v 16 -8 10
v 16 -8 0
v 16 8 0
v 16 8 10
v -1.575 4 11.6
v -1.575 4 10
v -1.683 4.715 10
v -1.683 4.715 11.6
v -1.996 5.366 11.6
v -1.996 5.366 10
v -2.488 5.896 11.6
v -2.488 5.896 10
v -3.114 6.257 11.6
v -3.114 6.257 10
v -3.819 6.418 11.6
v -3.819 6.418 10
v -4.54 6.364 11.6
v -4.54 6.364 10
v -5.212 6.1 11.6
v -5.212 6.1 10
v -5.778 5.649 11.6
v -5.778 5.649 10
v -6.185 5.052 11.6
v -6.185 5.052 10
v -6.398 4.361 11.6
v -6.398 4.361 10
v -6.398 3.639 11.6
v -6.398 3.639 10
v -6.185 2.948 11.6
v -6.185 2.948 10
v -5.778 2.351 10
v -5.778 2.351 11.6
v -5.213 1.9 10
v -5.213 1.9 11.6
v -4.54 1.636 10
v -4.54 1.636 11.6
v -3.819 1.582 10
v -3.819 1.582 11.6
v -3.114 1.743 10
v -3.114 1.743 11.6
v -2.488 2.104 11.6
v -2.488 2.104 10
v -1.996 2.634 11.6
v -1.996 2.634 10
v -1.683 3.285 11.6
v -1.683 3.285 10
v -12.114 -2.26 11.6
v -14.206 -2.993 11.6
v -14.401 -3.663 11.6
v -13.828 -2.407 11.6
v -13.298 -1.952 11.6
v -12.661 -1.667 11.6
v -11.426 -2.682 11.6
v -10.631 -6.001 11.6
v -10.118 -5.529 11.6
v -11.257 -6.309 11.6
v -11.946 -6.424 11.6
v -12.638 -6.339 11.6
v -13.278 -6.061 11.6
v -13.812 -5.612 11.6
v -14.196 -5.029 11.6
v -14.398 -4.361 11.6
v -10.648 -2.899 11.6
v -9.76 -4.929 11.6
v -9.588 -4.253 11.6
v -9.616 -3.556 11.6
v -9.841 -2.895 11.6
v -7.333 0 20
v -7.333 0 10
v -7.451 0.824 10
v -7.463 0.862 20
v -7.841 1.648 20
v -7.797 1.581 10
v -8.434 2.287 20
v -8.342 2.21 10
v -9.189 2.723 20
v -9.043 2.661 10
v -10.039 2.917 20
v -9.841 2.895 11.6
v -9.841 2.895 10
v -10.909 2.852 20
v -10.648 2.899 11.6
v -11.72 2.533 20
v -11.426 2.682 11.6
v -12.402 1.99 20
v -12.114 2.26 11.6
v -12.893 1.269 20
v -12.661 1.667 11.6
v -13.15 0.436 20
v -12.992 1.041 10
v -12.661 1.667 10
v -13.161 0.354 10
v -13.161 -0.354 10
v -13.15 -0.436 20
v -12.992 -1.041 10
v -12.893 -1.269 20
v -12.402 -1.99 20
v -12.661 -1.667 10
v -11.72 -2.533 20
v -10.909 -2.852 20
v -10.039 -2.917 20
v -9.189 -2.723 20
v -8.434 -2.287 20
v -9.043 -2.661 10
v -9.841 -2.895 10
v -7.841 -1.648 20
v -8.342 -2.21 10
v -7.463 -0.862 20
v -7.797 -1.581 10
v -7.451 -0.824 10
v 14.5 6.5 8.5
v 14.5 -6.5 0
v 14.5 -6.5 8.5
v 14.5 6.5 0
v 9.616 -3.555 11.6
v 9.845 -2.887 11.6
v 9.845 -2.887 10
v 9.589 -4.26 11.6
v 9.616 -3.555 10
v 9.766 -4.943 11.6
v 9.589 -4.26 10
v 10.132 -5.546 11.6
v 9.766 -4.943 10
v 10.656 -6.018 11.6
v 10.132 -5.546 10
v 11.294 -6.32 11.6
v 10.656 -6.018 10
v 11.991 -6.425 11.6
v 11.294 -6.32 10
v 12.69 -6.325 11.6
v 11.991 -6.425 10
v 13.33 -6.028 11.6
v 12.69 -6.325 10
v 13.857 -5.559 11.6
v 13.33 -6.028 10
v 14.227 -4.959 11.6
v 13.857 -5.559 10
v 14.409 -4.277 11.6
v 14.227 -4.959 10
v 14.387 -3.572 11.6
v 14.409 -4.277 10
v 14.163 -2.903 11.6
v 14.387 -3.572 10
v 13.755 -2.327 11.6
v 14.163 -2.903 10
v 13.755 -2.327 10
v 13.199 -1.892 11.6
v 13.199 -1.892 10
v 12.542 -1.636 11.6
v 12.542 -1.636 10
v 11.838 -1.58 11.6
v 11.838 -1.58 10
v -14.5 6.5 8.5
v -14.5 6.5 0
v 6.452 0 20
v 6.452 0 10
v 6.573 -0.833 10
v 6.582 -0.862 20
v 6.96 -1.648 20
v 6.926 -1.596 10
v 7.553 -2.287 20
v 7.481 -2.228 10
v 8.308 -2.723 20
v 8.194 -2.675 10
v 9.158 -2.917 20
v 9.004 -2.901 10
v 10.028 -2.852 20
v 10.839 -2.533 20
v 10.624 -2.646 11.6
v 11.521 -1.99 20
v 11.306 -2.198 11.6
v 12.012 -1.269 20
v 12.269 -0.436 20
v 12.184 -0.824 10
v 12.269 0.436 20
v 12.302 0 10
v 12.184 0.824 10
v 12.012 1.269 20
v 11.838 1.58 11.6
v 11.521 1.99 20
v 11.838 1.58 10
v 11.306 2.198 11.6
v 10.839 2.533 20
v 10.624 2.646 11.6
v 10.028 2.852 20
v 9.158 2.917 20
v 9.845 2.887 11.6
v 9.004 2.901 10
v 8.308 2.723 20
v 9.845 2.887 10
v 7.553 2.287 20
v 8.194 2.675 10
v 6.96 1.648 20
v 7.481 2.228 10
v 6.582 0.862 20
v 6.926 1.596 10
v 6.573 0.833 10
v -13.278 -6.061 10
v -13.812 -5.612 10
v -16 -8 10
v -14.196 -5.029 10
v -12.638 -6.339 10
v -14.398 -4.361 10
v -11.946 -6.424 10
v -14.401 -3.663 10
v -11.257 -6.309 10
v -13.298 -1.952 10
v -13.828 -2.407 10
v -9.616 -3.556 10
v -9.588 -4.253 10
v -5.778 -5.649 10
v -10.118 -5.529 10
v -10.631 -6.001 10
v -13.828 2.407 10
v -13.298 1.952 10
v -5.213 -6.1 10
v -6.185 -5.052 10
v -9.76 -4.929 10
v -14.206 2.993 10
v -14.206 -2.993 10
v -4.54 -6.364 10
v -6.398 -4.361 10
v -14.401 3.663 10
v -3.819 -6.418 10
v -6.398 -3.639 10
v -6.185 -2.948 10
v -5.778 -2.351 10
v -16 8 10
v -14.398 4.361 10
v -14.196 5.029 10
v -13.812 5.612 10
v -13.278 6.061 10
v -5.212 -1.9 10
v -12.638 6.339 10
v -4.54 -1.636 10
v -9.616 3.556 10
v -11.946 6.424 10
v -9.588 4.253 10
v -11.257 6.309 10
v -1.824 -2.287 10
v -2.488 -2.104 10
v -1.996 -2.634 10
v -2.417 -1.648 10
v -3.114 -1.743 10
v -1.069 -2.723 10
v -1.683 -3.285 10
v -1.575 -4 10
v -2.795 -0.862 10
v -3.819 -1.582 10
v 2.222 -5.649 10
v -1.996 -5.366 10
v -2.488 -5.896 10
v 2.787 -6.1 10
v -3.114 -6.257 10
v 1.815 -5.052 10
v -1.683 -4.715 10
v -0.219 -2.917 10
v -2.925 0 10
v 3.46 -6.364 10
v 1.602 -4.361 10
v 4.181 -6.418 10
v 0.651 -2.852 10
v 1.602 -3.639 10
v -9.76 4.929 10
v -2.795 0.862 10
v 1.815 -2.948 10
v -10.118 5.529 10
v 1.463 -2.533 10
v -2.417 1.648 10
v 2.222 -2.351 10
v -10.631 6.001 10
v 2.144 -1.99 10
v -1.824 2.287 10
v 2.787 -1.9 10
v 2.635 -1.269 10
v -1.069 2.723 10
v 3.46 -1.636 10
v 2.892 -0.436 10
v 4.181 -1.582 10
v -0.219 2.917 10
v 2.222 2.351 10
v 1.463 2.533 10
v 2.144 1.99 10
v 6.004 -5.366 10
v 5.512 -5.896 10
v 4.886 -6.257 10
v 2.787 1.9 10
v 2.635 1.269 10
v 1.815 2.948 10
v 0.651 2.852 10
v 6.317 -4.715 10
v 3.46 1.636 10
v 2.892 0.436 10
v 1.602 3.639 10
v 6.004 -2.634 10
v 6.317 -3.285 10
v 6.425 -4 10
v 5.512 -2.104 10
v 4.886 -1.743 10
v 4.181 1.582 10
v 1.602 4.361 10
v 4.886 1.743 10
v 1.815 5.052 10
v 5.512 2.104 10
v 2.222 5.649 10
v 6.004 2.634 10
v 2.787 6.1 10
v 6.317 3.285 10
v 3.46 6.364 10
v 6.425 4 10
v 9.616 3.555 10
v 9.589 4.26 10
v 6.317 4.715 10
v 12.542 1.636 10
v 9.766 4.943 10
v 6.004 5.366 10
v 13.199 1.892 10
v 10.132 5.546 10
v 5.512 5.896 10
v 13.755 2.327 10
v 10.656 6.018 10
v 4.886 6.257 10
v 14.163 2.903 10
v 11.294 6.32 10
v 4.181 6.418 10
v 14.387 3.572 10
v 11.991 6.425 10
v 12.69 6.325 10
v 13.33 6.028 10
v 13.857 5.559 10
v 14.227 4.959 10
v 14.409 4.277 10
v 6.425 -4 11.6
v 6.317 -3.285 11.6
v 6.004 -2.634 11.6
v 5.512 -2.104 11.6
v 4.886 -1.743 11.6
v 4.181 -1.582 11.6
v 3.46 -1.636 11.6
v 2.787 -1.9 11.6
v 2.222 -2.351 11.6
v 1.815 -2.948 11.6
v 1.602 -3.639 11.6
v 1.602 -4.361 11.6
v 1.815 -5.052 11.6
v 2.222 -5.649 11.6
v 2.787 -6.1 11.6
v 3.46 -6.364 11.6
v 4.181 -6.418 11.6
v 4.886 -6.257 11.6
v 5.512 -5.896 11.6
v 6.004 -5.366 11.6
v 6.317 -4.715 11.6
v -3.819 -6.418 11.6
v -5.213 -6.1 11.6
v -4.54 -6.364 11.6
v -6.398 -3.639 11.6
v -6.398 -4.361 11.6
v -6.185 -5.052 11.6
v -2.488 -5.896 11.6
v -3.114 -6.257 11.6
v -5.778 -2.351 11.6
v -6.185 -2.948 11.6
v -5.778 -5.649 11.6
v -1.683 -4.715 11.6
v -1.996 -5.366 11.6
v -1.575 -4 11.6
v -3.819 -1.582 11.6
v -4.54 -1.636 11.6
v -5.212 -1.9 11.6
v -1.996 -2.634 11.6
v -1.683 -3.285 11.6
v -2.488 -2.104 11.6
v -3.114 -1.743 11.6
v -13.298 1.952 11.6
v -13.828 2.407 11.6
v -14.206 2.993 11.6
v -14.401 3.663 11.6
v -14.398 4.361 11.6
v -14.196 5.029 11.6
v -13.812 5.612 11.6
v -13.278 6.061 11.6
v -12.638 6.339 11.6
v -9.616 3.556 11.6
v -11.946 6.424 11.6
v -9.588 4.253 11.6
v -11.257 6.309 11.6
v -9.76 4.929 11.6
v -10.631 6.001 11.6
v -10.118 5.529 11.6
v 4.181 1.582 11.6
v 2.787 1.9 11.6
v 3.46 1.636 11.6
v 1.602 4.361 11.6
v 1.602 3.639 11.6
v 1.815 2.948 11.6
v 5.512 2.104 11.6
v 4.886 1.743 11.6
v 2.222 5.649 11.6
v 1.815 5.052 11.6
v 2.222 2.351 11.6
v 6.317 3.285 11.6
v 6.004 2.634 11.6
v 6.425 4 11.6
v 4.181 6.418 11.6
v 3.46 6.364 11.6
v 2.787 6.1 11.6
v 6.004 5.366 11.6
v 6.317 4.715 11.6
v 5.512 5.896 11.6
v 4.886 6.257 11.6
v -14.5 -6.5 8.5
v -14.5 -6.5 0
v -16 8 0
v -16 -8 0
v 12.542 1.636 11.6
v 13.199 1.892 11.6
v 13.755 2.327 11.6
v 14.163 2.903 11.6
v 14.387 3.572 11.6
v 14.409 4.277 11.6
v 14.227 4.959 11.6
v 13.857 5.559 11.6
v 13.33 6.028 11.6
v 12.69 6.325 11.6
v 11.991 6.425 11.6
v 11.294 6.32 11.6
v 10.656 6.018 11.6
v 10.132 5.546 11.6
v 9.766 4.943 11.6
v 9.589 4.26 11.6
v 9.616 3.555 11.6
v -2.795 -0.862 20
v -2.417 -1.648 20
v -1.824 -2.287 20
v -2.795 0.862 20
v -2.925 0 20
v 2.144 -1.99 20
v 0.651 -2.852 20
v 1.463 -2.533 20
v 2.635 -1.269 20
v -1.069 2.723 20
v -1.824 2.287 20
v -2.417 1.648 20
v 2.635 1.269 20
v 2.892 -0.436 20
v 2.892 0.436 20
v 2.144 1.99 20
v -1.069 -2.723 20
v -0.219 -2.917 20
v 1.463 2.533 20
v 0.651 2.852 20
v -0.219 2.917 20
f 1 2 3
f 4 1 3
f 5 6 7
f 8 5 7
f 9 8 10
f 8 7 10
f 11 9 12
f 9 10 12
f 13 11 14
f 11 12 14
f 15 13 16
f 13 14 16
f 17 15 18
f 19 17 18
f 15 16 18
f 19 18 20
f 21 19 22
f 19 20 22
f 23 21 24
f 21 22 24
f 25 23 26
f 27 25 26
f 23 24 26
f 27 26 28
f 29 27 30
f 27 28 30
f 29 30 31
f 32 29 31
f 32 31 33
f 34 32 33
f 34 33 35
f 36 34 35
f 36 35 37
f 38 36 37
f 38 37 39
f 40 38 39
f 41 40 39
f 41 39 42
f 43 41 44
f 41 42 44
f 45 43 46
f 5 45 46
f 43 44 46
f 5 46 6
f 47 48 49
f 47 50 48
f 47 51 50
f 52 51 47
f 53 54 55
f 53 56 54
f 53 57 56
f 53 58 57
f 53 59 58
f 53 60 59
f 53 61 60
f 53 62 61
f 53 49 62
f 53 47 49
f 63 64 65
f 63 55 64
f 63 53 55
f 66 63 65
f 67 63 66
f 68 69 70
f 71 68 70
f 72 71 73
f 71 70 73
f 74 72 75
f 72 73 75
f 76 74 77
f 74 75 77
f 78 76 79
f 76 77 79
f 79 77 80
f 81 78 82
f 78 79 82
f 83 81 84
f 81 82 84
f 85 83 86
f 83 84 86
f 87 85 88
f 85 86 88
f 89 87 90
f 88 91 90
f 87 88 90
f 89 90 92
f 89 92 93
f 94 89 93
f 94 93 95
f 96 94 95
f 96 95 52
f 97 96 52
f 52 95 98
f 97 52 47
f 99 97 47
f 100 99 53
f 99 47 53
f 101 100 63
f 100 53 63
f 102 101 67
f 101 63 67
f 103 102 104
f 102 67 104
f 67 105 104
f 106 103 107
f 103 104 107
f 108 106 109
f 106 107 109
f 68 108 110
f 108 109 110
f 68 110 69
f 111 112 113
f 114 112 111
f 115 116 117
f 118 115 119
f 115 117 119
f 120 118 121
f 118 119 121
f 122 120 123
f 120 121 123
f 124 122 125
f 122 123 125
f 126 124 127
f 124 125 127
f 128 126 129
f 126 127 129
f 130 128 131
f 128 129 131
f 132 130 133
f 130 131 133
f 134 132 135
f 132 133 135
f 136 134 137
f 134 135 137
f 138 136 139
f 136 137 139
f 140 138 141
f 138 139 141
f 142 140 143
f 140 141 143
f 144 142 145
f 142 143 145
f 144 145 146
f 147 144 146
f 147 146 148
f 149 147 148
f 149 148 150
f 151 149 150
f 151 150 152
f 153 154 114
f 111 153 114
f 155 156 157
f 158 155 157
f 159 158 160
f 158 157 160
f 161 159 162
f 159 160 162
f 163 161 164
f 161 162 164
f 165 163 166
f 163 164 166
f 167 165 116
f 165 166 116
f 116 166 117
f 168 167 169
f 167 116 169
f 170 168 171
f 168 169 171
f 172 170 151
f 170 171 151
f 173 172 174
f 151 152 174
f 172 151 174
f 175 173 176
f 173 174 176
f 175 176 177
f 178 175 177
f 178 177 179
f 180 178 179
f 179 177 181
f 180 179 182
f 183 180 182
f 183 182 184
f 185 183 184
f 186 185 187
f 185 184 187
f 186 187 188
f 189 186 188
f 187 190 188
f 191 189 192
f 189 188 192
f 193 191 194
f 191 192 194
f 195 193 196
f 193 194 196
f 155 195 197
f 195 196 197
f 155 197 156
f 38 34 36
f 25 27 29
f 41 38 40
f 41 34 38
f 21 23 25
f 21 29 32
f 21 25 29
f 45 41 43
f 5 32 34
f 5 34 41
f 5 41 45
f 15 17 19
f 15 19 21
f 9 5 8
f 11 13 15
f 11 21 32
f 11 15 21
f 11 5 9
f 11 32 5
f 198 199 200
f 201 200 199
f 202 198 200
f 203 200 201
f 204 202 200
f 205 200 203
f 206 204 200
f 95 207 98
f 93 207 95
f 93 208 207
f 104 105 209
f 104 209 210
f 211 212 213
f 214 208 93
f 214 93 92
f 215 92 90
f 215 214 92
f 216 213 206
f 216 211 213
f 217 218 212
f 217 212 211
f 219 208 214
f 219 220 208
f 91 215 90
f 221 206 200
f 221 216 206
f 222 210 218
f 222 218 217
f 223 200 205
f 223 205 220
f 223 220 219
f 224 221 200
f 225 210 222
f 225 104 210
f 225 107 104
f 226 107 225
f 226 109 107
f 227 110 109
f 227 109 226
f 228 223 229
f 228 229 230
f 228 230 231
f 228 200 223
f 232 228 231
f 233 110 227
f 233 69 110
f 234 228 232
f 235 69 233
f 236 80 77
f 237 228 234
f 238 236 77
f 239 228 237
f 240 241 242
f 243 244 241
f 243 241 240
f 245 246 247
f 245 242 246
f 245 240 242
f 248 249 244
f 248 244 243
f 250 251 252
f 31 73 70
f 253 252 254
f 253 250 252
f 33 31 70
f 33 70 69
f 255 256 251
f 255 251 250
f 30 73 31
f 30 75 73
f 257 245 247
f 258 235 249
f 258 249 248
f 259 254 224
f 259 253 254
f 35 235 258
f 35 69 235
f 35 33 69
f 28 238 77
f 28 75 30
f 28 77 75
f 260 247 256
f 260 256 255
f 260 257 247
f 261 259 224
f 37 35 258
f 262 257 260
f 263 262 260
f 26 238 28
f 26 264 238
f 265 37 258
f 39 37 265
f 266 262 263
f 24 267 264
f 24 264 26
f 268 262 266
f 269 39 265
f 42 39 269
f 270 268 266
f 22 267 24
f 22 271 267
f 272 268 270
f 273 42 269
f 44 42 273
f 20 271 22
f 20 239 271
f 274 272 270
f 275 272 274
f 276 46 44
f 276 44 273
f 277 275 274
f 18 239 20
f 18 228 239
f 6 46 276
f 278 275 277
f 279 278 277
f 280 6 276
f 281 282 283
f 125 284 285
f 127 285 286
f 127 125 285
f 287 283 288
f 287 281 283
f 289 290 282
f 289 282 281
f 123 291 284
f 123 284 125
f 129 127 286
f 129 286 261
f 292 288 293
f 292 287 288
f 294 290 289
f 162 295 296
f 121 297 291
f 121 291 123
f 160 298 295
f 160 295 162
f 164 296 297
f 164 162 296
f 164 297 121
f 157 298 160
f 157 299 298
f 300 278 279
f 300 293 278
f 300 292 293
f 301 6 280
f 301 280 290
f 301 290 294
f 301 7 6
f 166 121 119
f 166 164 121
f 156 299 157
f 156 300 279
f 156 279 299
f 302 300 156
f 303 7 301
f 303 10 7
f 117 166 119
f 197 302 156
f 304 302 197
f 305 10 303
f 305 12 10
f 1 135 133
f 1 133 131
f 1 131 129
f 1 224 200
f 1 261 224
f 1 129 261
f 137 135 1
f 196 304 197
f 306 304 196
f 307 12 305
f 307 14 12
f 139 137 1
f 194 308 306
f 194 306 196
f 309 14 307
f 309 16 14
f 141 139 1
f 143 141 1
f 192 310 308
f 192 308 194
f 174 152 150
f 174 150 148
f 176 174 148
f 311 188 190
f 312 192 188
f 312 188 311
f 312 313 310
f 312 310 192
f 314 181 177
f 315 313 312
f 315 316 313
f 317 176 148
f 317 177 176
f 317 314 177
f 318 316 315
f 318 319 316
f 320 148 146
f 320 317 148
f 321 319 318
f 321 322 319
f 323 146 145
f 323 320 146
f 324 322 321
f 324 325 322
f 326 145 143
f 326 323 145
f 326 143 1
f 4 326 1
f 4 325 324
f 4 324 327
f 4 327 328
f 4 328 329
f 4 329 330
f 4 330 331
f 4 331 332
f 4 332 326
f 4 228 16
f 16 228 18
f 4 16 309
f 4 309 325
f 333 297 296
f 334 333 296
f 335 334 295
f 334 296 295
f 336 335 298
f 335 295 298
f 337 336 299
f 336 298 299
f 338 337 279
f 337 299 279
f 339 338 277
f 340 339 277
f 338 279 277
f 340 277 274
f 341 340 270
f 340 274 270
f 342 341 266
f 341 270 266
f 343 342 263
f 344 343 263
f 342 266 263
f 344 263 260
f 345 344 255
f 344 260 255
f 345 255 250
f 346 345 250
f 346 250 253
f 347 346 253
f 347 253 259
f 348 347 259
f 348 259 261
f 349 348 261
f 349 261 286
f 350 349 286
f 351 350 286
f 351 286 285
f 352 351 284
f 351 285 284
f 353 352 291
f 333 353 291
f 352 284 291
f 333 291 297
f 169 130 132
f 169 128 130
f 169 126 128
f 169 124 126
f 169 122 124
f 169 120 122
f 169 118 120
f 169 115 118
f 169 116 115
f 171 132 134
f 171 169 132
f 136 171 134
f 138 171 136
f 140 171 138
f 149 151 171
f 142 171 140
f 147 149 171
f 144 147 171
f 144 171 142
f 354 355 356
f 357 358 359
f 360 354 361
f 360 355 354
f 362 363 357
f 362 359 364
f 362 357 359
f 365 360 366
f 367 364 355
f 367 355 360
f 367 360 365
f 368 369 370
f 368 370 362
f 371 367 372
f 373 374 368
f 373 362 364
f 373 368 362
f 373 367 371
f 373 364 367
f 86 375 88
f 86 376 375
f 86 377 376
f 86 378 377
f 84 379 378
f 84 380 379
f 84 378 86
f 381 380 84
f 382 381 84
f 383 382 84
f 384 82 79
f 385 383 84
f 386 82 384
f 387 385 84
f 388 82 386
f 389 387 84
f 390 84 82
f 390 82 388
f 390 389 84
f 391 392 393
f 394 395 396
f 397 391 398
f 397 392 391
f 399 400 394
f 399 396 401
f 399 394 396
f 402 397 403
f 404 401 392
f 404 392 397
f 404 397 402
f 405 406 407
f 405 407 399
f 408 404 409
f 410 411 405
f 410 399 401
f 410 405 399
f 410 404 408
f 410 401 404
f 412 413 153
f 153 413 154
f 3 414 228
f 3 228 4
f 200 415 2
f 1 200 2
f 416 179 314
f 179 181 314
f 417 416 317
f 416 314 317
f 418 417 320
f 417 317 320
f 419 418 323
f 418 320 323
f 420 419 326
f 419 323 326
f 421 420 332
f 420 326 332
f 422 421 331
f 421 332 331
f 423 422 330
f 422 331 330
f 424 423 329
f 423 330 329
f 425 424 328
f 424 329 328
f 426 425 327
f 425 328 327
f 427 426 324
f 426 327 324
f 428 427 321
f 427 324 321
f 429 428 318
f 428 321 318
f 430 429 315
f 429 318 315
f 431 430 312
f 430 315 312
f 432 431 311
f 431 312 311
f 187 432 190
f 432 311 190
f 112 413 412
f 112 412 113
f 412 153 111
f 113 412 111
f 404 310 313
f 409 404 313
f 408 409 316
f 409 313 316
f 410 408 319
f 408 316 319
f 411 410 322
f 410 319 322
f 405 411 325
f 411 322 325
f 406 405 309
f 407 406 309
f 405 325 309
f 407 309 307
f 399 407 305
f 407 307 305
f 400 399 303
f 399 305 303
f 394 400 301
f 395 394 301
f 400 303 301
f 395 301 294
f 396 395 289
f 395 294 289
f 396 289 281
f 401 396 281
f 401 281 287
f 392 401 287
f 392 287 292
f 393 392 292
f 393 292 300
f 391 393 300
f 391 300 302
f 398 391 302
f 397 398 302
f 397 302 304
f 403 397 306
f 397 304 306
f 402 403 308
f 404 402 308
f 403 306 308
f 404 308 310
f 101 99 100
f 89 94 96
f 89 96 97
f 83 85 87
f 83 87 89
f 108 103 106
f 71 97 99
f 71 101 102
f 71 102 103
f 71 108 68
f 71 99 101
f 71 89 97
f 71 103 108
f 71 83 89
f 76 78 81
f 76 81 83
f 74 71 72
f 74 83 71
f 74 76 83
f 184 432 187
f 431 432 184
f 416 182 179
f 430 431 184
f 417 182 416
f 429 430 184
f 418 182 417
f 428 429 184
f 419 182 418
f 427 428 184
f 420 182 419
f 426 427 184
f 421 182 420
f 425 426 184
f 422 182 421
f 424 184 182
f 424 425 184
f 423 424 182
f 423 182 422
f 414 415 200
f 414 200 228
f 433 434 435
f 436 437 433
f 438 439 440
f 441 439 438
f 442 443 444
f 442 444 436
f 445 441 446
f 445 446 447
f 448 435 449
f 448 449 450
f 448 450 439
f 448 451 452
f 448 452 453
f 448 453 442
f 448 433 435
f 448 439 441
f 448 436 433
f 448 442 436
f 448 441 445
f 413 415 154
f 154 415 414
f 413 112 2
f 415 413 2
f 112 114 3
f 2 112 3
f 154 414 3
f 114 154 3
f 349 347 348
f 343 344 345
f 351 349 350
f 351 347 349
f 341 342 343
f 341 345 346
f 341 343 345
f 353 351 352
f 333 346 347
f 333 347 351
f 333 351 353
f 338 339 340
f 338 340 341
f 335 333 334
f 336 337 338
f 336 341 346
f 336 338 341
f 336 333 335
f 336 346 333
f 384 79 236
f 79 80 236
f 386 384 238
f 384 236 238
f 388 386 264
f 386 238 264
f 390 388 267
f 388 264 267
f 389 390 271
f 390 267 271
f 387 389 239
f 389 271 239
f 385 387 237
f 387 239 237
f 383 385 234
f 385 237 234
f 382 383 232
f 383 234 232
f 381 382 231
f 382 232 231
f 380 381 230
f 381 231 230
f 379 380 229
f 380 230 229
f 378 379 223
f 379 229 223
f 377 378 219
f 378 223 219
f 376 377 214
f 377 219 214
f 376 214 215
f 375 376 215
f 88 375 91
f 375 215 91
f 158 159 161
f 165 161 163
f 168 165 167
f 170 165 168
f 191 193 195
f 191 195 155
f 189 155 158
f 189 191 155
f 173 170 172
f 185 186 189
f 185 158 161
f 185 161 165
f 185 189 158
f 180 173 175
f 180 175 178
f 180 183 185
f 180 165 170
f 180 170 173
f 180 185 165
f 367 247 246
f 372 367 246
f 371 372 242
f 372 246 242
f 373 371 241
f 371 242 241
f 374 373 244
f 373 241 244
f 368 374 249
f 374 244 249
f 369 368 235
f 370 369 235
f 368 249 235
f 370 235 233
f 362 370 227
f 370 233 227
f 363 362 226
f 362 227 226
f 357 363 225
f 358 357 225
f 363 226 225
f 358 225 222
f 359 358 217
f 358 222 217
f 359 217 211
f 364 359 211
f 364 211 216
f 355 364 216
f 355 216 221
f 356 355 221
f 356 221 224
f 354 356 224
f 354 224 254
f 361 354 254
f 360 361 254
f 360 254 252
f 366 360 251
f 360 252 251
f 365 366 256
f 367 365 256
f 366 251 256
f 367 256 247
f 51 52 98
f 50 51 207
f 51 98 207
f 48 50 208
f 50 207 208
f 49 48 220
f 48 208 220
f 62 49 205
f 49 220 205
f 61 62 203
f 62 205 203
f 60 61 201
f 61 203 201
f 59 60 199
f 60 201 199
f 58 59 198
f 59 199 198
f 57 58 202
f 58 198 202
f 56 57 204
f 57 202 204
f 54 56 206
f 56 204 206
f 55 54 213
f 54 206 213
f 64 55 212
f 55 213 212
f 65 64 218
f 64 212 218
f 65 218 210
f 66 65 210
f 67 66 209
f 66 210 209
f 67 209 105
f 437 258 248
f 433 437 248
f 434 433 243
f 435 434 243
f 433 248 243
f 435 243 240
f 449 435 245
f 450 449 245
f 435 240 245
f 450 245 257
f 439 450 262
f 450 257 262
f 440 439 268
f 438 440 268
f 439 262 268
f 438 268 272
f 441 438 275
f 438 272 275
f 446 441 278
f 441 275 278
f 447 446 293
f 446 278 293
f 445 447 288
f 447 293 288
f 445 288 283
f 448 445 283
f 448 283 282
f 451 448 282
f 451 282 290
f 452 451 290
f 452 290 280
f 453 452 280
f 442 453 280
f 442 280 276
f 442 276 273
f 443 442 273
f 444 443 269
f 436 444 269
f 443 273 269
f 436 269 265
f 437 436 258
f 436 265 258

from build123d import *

# Parameters (mm, degrees)
F0_W     = 32
F0_H     = 16
F1_DEPTH = 10
F2_T     = -1.5
F3_R     = 2.425
F4_DEPTH = 1.6
F5_R     = 2.925
F6_DEPTH = 10


with BuildPart() as f1:
    # F0 (on Top) → F1 (new body)
    with BuildSketch(Plane.XY):
        Rectangle(F0_W, F0_H)
    extrude(amount=F1_DEPTH)

    # F2
    f2_openings = [f1.faces().sort_by_distance(p)[0] for p in [
        (0, 0, 0),
    ]]
    offset(amount=F2_T, openings=f2_openings)

    # F3 (on face) → F4 (join)
    with BuildSketch(Plane.XY.offset(10)):
        with Locations((-12, -4)):
            Circle(F3_R)
        with Locations((-12, 4)):
            Circle(F3_R)
        with Locations((-4, -4)):
            Circle(F3_R)
        with Locations((-4, 4)):
            Circle(F3_R)
        with Locations((4, -4)):
            Circle(F3_R)
        with Locations((4, 4)):
            Circle(F3_R)
        with Locations((12, -4)):
            Circle(F3_R)
        with Locations((12, 4)):
            Circle(F3_R)
    extrude(amount=F4_DEPTH)

    # F5 (on face) → F6 (join)
    with BuildSketch(Plane.XY.offset(10)):
        with Locations((-10.257971, 0)):
            Circle(F5_R)
        with BuildLine():
            ThreePointArc((12.301918, 0), (9.376918, 2.925), (6.451918, 0))
            ThreePointArc((6.451918, 0), (9.376918, -2.925), (12.301918, 0))
        make_face()
        with BuildLine():
            ThreePointArc((2.925, 0), (0, 2.925), (-2.925, 0))
            Line((-2.925, 0), (0, 0))
            Line((0, 0), (2.925, 0))
        make_face()
        with BuildLine():
            Line((0, 0), (-2.925, 0))
            ThreePointArc((-2.925, 0), (0, -2.925), (2.925, 0))
            Line((2.925, 0), (0, 0))
        make_face()
    extrude(amount=F6_DEPTH)


solid = f1.part
